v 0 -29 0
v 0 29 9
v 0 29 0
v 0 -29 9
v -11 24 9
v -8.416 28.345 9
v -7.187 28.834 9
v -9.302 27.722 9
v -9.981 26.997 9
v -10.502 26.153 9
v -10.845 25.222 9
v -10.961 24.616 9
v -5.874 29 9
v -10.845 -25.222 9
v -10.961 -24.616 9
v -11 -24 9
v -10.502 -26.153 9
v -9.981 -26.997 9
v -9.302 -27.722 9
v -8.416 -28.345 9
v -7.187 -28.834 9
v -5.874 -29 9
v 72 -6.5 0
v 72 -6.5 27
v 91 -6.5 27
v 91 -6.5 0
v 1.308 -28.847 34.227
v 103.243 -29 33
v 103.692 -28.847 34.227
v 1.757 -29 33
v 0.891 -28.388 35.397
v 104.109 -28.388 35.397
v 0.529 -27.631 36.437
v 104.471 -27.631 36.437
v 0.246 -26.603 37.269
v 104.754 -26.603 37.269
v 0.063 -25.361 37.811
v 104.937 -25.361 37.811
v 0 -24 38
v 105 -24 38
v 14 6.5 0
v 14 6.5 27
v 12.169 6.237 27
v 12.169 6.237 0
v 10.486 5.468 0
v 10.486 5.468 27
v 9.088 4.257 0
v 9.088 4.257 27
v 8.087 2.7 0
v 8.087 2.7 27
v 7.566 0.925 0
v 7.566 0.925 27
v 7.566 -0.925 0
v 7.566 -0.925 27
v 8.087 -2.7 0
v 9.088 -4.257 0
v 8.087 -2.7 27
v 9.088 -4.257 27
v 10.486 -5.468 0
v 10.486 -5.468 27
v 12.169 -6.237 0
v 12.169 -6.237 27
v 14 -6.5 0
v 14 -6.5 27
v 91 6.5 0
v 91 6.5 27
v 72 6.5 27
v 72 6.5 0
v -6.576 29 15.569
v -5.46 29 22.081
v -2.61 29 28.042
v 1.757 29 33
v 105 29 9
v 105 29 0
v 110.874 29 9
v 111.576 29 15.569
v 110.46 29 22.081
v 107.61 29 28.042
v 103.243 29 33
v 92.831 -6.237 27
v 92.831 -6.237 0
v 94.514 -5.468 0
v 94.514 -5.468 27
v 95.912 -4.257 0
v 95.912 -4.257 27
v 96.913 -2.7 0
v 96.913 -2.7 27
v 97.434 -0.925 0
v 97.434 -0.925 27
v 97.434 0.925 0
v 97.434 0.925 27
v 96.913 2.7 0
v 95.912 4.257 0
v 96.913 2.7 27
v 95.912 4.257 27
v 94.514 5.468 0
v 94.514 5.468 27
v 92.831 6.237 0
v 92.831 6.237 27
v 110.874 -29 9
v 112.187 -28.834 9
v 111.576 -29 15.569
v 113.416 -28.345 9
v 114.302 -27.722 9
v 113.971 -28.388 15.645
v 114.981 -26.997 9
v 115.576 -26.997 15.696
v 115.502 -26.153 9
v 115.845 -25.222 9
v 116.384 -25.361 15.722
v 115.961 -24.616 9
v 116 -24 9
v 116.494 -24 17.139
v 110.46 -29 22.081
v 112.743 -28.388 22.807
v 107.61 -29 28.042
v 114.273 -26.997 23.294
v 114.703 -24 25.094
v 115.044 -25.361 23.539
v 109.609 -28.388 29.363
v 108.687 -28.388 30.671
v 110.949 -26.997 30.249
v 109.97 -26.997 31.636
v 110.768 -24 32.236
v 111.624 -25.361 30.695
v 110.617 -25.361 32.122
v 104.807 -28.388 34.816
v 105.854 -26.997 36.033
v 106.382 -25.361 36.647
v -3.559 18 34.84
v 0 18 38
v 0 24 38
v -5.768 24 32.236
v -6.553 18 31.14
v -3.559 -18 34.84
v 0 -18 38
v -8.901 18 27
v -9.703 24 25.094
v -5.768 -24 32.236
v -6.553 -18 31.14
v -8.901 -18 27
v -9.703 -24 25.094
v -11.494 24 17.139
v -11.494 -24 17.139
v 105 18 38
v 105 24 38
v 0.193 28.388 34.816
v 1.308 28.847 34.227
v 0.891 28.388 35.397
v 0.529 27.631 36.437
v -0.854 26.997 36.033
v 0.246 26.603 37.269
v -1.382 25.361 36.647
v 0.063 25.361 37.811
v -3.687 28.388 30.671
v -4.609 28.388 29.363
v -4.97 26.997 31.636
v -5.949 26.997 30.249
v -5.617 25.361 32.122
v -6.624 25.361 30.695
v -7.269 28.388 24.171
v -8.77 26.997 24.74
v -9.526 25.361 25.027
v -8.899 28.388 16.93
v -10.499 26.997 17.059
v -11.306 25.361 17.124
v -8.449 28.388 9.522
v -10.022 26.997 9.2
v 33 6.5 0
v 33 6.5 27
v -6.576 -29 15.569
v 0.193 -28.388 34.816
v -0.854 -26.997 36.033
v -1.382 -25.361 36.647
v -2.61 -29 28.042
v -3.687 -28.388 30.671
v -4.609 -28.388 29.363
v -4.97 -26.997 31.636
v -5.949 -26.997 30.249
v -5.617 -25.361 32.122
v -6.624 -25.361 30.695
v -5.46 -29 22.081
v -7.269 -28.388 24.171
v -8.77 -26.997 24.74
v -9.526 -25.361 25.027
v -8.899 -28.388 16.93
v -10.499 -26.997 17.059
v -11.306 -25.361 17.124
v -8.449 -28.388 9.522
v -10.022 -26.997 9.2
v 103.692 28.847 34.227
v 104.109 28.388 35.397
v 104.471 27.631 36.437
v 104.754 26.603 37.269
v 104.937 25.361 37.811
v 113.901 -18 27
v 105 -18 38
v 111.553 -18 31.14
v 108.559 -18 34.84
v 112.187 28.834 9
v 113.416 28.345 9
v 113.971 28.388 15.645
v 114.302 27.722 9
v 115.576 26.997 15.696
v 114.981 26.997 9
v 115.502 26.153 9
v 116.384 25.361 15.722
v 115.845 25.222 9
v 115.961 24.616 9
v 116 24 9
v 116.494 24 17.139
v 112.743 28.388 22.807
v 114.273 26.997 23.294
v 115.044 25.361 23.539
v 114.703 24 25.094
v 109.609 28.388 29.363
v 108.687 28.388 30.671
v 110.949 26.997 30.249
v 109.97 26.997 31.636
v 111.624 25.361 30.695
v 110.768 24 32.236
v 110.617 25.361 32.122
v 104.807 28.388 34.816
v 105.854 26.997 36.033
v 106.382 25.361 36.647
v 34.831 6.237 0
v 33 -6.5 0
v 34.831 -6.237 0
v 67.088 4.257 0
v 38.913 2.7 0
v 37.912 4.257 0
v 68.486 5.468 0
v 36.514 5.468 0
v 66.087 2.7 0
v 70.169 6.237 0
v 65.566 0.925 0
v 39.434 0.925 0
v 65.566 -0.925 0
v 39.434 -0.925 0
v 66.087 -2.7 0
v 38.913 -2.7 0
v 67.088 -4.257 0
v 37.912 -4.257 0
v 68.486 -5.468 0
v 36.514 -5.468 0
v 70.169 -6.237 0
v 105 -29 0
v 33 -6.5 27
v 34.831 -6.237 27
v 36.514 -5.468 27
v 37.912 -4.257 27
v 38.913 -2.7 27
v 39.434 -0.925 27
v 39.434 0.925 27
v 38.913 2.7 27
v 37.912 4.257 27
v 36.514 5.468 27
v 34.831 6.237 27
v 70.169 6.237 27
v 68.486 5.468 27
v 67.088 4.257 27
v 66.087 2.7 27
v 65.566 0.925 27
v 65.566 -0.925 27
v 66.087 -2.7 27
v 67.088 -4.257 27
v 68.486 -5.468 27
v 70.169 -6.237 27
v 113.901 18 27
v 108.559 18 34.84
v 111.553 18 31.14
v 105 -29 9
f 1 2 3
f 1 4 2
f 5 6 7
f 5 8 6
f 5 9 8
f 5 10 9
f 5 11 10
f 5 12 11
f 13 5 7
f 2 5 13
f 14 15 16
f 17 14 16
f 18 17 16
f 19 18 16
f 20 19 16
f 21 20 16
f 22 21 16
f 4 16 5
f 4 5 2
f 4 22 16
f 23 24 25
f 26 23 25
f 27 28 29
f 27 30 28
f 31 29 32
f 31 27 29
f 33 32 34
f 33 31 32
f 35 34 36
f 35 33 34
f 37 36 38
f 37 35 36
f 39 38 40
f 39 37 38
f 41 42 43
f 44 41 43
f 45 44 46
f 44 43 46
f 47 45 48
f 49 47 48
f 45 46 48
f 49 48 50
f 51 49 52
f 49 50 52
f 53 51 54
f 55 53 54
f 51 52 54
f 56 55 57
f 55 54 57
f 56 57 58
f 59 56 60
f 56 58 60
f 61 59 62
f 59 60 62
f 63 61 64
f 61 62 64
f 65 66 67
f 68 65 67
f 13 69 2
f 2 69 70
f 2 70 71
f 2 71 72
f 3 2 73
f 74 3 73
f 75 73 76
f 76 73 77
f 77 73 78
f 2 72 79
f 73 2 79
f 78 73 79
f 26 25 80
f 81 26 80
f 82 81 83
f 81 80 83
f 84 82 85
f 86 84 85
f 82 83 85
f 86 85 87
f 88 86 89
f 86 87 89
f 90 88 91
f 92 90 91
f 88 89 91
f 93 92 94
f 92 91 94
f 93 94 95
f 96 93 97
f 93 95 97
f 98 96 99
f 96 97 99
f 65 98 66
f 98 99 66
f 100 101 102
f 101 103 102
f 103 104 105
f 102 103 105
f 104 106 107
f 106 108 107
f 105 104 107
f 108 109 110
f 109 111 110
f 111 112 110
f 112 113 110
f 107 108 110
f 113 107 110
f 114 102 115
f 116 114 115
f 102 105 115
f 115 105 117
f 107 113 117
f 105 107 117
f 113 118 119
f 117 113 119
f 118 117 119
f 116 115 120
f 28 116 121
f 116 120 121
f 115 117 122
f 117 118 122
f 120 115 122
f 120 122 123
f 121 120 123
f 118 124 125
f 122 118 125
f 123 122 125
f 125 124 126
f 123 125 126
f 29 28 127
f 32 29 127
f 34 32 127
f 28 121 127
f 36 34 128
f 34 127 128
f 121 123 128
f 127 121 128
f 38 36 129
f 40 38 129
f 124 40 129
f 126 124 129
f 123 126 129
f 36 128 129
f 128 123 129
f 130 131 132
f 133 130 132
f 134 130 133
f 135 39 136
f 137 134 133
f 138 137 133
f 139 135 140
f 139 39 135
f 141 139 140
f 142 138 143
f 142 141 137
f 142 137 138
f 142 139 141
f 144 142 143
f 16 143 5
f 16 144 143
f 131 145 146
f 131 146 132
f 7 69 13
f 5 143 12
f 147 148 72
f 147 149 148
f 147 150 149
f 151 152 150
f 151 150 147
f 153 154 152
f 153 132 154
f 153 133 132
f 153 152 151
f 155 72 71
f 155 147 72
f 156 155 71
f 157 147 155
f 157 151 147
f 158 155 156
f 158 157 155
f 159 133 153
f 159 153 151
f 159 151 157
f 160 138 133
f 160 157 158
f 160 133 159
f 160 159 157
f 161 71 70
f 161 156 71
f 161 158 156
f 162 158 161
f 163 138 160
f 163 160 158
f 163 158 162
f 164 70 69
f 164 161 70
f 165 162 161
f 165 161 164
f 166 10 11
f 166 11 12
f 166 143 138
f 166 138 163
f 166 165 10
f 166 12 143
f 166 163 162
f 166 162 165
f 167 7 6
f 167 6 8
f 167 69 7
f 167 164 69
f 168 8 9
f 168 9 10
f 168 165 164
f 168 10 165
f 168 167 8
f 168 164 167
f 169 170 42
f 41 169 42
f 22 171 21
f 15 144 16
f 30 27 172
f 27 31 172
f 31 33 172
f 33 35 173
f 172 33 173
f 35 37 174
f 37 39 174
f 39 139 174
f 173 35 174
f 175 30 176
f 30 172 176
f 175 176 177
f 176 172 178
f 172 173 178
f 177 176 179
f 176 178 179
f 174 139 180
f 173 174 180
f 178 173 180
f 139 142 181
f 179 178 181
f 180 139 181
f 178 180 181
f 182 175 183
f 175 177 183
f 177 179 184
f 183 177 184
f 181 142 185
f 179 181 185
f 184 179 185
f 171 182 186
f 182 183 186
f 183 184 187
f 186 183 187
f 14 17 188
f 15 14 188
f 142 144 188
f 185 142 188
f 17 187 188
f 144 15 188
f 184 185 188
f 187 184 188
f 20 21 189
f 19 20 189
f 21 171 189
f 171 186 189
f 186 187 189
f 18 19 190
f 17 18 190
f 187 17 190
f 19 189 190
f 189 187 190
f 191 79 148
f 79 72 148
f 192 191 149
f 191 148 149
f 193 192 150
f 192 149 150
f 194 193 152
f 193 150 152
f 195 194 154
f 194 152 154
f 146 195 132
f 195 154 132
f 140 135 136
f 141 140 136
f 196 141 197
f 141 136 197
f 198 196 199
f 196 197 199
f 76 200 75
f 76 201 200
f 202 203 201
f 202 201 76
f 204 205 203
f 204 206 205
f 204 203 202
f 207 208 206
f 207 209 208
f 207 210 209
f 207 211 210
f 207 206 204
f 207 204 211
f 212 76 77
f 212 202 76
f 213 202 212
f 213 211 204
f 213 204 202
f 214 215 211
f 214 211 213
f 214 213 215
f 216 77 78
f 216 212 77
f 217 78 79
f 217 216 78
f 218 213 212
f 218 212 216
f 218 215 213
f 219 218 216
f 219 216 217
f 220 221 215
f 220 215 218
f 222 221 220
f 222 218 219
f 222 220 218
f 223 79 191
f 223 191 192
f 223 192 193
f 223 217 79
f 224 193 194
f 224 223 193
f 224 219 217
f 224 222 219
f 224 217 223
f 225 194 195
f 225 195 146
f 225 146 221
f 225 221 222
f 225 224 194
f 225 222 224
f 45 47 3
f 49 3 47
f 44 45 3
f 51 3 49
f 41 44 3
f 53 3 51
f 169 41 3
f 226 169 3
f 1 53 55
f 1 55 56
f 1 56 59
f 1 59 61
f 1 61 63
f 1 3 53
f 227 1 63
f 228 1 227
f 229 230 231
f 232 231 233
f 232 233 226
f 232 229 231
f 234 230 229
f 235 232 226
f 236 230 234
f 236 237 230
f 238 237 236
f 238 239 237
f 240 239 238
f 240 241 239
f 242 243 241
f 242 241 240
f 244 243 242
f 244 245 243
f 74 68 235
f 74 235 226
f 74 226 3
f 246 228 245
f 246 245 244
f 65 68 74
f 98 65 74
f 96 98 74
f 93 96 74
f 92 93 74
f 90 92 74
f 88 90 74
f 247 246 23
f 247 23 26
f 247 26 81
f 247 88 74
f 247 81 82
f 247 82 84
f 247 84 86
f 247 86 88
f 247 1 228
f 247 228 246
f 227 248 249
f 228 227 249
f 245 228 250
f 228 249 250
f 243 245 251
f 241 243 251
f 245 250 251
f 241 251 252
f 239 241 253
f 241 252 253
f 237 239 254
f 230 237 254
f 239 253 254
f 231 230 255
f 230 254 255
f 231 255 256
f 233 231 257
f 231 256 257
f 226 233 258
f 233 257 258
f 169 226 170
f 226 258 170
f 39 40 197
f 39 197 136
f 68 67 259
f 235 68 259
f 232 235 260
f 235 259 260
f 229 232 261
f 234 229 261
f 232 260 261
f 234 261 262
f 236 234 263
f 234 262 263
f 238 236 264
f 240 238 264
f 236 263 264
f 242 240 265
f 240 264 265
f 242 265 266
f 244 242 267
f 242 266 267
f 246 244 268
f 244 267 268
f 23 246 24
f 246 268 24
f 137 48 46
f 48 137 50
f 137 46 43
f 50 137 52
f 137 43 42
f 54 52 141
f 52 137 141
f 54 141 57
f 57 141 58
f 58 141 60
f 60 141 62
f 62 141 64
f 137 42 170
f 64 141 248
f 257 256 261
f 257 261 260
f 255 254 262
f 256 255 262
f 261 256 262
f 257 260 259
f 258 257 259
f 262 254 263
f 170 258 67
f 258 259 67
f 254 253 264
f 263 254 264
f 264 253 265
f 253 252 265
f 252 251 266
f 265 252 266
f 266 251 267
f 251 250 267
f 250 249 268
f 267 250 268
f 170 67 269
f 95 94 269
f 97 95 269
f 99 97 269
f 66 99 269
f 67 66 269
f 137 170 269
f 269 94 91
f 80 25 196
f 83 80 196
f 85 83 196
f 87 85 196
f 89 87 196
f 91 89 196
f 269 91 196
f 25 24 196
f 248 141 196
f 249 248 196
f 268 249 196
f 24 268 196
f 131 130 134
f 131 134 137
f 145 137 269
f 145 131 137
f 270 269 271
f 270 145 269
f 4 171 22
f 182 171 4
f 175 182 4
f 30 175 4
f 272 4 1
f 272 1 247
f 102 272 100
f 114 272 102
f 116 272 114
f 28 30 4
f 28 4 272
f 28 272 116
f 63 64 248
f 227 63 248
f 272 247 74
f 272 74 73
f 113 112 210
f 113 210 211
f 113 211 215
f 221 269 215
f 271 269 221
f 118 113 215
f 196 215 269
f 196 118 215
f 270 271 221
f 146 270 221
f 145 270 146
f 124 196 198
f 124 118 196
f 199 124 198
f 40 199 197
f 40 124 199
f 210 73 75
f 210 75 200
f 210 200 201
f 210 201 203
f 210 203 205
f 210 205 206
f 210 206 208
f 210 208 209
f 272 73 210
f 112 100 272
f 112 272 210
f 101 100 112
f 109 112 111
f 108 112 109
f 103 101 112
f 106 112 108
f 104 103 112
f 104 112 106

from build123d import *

# Parameters (mm, degrees)
F1_DEPTH = 29
F3_DEPTH = 38.001
F5_DEPTH = 18
F6_R     = 5


with BuildPart() as f1:
    # F0 (on Front) → F1 (new body, symmetric)
    with BuildSketch(Plane.XZ):
        with BuildLine():
            Line((0, 9), (0, 0))
            Line((0, 0), (105, 0))
            Line((105, 0), (105, 9))
            Line((105, 9), (116, 9))
            ThreePointArc((116, 9), (114.7027189695, 25.0941347815), (105, 38))
            Line((105, 38), (0, 38))
            ThreePointArc((0, 38), (-9.7027189695, 25.0941347815), (-11, 9))
            Line((-11, 9), (0, 9))
        make_face()
    extrude(amount=F1_DEPTH, both=True)

    # F2 (on face) → F3 (cut, through all)
    with BuildSketch(Plane.XY.offset(38)):
        with BuildLine():
            ThreePointArc((14, 6.5), (7.5, 0), (14, -6.5))
            Line((14, -6.5), (33, -6.5))
            ThreePointArc((33, -6.5), (39.5, 0), (33, 6.5))
            Line((33, 6.5), (14, 6.5))
        make_face()
        with BuildLine():
            ThreePointArc((72, 6.5), (65.5, 0), (72, -6.5))
            Line((72, -6.5), (91, -6.5))
            ThreePointArc((91, -6.5), (97.5, 0), (91, 6.5))
            Line((91, 6.5), (72, 6.5))
        make_face()
    extrude(amount=-F3_DEPTH, mode=Mode.SUBTRACT)

    # F4 (on Front) → F5 (cut, symmetric)
    with BuildSketch(Plane.XZ):
        with BuildLine():
            Line((105, 38), (0, 38))
            ThreePointArc((0, 38), (-5.1316907331, 33.0512170183), (-8.9009712184, 27))
            Line((-8.9009712184, 27), (113.9009712184, 27))
            ThreePointArc((113.9009712184, 27), (110.1316907331, 33.0512170183), (105, 38))
        make_face()
    extrude(amount=F5_DEPTH, both=True, mode=Mode.SUBTRACT)

    # F6
    f6_edges = [f1.edges().sort_by_distance(p)[0] for p in [
        (114.702719, 29, 25.094135),
        (52.5, 29, 38),
        (-9.702719, 29, 25.094135),
        (114.702719, -29, 25.094135),
        (52.5, -29, 38),
        (-9.702719, -29, 25.094135),
    ]]
    fillet(f6_edges, radius=F6_R)


solid = f1.part
